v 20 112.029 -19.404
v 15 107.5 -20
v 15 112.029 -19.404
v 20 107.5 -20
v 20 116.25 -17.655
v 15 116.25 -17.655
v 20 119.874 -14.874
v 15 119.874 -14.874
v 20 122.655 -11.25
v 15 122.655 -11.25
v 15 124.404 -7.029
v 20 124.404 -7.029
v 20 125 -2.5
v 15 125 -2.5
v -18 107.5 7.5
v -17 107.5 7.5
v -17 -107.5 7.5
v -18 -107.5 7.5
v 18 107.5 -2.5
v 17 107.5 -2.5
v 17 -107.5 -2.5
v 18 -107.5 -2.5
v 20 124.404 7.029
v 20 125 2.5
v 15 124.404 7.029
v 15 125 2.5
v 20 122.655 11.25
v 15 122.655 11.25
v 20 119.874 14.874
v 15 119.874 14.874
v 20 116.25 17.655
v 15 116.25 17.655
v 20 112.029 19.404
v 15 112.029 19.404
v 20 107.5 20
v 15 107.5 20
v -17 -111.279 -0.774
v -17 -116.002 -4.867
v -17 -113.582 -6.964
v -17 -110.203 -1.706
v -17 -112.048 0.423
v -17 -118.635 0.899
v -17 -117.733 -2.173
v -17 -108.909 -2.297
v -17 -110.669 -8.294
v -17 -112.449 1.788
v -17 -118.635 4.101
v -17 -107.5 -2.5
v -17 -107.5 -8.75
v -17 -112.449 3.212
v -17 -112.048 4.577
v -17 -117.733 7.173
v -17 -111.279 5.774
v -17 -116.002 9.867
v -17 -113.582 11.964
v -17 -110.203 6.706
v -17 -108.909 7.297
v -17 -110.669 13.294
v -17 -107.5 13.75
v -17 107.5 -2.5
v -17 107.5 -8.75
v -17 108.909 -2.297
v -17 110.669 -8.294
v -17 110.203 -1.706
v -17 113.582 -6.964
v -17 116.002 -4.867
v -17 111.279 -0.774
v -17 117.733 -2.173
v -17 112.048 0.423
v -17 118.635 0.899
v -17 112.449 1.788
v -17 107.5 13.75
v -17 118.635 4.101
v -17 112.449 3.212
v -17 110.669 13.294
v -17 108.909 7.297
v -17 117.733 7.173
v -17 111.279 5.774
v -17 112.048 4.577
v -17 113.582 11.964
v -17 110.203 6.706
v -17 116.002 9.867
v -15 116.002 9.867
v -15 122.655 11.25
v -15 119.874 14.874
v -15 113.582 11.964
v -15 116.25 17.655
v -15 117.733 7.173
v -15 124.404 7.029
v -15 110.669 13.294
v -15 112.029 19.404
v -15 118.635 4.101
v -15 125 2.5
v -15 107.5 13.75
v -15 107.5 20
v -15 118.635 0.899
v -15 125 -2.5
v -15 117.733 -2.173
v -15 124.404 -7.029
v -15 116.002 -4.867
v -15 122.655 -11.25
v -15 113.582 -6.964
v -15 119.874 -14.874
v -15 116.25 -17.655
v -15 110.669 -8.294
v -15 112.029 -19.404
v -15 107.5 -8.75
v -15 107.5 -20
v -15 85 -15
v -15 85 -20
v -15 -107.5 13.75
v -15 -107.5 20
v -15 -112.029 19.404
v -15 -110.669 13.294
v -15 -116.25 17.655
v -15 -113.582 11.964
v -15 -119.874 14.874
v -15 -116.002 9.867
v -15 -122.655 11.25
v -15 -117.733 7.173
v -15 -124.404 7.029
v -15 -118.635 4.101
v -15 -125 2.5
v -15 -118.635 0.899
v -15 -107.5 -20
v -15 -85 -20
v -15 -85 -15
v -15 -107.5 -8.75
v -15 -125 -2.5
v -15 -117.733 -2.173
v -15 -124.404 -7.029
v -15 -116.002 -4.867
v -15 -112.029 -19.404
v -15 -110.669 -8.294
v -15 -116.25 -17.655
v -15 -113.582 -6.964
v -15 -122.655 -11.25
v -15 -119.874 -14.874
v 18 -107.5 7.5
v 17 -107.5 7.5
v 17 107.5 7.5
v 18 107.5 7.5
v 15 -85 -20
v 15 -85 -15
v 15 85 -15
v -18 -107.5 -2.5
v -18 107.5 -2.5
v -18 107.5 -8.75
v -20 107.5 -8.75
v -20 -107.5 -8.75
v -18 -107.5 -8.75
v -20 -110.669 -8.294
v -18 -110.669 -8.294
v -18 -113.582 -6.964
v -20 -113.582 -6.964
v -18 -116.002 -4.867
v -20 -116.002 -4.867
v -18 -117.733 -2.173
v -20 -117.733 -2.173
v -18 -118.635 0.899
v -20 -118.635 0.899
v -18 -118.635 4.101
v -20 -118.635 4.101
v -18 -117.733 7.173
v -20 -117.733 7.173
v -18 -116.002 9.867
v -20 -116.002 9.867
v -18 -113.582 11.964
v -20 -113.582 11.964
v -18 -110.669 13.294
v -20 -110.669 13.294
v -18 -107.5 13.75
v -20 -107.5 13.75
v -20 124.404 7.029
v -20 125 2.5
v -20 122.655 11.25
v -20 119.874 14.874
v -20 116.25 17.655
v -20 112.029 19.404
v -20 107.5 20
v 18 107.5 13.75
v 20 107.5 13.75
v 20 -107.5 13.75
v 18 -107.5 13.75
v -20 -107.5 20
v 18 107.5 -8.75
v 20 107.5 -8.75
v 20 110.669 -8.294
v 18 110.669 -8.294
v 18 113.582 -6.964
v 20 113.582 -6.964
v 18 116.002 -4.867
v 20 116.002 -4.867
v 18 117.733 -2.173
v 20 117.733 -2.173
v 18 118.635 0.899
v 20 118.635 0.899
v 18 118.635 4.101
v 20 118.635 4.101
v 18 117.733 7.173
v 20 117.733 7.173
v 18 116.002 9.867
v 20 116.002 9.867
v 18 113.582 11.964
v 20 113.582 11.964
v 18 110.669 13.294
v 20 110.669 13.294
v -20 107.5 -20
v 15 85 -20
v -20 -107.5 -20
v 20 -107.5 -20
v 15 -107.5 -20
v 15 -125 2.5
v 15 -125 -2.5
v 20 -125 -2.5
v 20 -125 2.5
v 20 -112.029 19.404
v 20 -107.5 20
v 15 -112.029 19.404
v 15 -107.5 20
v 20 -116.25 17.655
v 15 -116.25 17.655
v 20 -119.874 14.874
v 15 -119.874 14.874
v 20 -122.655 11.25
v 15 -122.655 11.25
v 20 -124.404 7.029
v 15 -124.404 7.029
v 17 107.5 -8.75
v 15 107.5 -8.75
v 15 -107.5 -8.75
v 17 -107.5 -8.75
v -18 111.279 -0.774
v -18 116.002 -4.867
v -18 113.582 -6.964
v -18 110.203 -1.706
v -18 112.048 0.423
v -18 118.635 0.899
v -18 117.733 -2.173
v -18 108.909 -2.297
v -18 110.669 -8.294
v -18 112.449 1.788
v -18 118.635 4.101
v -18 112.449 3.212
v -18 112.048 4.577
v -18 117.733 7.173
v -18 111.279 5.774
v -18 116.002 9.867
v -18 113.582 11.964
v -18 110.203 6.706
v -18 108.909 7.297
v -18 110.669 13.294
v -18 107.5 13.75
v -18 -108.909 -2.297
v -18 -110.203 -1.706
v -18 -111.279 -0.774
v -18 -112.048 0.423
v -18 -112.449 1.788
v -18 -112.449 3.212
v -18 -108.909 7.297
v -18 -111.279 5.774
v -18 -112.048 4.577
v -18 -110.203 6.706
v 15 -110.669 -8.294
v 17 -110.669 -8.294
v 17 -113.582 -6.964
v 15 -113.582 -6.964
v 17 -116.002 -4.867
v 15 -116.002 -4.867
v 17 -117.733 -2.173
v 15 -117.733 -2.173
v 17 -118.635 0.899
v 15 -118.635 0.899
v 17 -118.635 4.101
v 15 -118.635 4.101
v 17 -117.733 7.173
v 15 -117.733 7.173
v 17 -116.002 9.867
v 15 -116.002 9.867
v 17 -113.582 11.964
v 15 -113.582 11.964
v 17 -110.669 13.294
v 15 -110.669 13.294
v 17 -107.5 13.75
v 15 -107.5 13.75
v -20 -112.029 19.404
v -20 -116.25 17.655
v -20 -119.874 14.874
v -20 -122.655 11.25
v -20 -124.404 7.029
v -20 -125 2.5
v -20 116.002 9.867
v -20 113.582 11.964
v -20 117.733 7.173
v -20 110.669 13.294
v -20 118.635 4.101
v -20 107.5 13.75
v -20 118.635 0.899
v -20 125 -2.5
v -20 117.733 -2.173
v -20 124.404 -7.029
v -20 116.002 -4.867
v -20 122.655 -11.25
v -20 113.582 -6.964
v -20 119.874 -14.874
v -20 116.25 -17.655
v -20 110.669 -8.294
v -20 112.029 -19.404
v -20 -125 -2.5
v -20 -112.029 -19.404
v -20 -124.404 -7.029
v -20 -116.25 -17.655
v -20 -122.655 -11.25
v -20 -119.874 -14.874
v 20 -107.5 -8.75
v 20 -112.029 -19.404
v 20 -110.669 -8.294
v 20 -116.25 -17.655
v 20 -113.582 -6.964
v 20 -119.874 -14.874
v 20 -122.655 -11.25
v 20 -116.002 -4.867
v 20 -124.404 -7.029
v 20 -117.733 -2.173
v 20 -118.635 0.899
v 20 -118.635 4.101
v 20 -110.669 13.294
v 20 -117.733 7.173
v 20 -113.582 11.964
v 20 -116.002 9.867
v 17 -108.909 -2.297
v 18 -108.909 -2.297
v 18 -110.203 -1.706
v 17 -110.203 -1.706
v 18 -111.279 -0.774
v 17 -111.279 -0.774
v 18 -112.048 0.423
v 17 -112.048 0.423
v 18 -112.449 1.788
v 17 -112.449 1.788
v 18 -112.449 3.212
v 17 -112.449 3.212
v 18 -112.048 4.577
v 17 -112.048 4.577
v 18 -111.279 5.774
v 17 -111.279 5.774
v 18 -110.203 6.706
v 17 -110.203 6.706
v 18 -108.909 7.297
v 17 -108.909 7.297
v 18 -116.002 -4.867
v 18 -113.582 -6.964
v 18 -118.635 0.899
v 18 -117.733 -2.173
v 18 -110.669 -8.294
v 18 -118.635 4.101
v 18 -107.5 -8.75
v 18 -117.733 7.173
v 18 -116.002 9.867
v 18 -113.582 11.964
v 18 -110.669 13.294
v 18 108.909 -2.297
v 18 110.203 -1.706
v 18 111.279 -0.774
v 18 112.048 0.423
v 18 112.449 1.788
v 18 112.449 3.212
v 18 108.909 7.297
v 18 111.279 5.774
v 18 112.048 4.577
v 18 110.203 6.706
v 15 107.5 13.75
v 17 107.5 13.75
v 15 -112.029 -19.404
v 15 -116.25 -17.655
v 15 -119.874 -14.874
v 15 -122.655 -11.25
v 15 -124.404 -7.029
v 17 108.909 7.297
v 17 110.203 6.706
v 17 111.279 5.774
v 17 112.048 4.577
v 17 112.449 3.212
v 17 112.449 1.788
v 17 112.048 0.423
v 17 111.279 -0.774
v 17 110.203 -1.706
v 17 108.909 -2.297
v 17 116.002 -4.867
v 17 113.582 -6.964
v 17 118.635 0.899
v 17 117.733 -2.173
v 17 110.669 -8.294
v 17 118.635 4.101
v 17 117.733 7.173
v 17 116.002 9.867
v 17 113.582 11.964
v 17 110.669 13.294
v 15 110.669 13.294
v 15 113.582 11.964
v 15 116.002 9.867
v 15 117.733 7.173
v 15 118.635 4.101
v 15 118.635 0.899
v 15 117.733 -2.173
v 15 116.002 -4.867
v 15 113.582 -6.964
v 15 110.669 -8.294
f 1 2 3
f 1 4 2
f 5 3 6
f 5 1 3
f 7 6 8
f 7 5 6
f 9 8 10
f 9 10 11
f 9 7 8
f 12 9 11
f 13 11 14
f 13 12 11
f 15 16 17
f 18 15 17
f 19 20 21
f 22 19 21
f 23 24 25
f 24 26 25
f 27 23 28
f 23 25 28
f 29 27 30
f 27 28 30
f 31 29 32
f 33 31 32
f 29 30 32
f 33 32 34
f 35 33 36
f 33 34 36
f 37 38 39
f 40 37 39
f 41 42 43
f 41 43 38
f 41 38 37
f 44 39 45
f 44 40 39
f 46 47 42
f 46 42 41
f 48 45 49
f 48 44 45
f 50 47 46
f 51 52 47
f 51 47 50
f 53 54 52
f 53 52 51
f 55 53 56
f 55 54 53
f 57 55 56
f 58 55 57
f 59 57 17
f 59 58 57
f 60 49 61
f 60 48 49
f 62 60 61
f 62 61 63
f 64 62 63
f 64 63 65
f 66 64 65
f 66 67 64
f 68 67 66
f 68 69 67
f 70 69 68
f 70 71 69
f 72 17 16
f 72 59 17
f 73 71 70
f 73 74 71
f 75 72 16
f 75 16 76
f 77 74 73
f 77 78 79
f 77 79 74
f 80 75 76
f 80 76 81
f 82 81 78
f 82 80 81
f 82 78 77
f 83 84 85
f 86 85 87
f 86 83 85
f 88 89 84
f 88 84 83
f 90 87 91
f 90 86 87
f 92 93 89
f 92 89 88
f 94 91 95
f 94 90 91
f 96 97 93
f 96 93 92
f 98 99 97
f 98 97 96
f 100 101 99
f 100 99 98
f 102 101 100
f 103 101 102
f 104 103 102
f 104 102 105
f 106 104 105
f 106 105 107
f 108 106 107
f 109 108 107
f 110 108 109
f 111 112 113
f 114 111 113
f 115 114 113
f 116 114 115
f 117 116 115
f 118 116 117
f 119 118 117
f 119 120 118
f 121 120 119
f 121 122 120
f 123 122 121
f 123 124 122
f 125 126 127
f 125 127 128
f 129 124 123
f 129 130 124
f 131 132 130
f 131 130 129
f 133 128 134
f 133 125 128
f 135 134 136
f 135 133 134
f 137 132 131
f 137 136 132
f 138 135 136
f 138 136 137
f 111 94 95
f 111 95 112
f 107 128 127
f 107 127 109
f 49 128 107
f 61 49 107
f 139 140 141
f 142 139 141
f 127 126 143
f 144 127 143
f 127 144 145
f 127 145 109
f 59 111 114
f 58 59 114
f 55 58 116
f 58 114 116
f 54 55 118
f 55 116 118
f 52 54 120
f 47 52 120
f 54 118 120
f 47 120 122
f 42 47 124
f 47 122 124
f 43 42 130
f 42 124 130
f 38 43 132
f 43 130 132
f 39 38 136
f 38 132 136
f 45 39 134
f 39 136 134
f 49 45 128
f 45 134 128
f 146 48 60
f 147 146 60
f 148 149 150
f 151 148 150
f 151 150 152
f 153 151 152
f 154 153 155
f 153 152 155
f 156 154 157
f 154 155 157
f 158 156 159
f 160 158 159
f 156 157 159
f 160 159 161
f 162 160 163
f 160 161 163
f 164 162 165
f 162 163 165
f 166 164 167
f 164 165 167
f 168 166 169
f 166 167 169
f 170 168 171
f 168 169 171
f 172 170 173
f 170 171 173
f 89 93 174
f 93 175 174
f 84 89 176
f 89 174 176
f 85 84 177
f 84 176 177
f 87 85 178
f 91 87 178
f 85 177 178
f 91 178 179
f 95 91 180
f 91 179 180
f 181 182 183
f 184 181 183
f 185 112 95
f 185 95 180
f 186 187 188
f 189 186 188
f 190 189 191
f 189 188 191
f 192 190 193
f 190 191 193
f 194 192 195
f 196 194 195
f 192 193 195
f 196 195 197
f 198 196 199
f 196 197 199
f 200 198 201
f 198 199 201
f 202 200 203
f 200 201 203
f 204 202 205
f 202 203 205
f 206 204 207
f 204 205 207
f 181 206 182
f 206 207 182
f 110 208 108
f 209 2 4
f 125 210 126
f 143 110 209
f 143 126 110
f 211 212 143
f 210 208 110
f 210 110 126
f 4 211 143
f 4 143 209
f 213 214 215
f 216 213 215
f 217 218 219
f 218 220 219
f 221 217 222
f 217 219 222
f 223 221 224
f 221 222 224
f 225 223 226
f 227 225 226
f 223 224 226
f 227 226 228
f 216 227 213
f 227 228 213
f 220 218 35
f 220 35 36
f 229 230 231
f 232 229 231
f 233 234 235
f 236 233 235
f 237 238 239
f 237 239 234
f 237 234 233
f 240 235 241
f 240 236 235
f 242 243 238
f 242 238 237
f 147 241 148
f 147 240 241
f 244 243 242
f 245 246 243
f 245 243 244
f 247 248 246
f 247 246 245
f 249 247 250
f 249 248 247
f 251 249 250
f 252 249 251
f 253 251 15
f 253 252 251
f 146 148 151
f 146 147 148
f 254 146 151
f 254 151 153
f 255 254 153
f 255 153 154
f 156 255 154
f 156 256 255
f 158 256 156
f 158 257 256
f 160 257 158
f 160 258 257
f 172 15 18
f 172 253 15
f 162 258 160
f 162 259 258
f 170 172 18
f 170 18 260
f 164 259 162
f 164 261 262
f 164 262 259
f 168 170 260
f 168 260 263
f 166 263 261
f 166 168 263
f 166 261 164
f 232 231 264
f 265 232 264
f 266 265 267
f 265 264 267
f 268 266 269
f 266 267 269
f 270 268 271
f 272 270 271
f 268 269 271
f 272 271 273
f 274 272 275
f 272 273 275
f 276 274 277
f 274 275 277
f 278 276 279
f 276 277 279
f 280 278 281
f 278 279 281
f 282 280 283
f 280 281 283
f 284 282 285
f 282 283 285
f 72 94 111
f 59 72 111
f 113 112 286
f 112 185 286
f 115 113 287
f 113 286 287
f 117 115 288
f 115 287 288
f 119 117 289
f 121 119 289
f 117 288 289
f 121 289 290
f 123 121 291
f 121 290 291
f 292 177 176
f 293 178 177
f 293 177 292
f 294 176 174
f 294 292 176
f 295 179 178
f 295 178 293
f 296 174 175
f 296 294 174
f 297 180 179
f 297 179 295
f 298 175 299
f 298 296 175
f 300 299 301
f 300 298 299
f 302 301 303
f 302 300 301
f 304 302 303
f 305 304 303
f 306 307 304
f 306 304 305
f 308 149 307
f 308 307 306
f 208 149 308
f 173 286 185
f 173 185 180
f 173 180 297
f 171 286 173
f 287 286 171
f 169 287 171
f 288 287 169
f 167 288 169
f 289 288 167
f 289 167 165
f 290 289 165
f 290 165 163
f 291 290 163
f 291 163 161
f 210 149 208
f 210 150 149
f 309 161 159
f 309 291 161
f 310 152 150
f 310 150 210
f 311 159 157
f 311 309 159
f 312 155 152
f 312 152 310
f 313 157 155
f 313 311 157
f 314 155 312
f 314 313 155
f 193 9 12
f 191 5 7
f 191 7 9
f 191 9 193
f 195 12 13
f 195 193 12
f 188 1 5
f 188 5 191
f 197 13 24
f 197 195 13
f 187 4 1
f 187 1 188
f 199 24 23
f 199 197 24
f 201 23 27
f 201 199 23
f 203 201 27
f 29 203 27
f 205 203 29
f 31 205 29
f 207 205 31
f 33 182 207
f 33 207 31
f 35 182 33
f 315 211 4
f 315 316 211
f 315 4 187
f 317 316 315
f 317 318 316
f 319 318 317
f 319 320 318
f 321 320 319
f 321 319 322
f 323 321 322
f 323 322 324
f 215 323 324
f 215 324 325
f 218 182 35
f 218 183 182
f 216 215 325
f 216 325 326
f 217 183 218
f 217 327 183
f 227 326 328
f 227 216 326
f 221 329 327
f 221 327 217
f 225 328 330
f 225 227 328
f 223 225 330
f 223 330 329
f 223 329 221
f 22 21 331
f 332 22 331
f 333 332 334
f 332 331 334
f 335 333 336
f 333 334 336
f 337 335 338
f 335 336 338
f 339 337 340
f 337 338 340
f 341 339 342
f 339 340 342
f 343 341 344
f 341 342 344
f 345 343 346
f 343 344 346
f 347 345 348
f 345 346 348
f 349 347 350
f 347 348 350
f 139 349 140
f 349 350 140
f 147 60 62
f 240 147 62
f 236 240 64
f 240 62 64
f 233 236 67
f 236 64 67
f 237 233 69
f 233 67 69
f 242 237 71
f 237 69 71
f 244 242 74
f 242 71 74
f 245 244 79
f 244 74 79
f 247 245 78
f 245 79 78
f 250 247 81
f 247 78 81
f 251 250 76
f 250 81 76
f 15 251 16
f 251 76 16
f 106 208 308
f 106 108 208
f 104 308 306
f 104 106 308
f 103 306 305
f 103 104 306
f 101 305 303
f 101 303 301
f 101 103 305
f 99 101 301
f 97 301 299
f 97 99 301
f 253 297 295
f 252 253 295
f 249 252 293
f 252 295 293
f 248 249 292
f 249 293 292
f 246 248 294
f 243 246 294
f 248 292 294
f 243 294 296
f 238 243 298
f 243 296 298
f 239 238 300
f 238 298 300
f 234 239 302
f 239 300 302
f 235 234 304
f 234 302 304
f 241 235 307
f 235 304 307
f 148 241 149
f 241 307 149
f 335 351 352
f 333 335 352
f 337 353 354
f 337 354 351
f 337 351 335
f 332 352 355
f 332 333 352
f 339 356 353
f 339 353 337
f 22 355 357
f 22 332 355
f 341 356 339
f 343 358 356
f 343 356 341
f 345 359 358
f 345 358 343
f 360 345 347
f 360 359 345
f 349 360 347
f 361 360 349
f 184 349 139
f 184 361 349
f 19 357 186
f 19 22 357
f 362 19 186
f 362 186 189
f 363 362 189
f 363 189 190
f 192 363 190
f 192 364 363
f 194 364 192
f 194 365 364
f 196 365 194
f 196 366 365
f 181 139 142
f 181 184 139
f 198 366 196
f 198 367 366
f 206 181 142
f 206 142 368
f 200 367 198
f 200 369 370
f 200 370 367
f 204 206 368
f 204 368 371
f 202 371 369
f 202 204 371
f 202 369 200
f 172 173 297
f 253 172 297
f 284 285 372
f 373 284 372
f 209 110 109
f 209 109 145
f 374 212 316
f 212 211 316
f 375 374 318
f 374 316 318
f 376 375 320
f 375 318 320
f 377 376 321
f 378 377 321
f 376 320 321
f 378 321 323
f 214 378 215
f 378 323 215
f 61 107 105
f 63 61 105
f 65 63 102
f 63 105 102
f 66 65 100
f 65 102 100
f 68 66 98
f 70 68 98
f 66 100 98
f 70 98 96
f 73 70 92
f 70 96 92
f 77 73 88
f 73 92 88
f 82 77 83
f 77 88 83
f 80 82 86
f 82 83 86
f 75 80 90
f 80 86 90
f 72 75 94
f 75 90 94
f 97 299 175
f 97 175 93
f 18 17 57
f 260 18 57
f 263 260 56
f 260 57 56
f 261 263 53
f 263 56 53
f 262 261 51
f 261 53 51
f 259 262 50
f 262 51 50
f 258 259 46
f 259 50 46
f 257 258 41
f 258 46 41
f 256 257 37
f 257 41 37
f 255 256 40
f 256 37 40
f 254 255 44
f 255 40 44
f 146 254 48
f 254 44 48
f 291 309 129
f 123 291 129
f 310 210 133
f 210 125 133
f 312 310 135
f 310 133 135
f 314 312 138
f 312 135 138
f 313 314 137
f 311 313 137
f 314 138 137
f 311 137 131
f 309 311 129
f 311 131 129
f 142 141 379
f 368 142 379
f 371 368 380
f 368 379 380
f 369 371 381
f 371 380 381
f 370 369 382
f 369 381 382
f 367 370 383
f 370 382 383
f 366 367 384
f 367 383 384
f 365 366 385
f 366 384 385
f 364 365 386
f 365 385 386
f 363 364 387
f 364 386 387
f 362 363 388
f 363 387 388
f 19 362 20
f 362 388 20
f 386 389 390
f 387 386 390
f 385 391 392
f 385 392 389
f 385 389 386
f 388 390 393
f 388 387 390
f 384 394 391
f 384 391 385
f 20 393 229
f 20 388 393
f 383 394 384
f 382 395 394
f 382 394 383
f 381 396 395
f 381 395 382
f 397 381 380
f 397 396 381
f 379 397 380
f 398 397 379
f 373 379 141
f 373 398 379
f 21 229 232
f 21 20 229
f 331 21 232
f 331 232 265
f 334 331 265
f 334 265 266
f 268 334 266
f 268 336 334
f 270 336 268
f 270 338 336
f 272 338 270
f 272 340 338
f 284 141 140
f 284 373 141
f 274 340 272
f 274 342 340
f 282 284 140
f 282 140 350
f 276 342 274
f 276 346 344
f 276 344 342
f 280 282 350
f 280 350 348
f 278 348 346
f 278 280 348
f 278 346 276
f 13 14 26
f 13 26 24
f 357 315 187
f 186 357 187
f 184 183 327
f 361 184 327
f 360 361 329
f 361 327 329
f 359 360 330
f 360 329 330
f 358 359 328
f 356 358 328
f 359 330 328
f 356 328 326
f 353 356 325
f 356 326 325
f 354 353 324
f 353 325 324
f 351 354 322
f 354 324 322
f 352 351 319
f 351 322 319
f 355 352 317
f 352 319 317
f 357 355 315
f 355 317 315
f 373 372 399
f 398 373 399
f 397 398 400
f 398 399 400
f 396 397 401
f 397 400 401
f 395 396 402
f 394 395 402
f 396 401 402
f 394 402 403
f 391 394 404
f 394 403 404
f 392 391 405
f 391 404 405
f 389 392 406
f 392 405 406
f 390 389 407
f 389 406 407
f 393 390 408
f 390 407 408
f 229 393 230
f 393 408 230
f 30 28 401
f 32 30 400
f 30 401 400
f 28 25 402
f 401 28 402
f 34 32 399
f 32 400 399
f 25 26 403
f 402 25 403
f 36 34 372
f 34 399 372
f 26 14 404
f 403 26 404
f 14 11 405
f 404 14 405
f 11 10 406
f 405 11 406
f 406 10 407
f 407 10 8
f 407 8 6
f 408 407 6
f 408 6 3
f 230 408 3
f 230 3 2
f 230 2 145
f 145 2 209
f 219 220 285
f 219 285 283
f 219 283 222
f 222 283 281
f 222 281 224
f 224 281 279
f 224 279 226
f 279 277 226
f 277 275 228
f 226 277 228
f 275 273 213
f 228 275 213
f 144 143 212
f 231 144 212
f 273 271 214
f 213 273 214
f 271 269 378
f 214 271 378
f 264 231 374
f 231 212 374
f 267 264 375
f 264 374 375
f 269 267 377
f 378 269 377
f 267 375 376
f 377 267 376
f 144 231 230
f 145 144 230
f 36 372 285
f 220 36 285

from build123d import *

# Parameters (mm, degrees)
F1_DEPTH      = 125
F1_DEPTH_BACK = 125
F6_DEPTH      = 5.001
F7_DEPTH      = 5.001
F8_DEPTH      = 2
F9_DEPTH      = 2
F10_DEPTH     = 2
F11_DEPTH     = 2
F12_W         = 30
F12_H         = 40
F13_DEPTH     = 40.001
F14_R         = 17.5


with BuildPart() as f1:
    # F0 (on Front) → F1 (new body, two sides)
    with BuildSketch(Plane.XZ) as f1_sk:
        Polygon((-20, -20), (20, -20), (20, 20), (15, 20), (15, -15), (-15, -15), (-15, 20), (-20, 20), align=None)
    extrude(amount=F1_DEPTH)
    extrude(f1_sk.sketch, amount=-F1_DEPTH_BACK)

    # F3 (on face) → F6 (cut, through all)
    with BuildSketch(Plane(origin=(15, 0, 0), x_dir=(0, -1, 0), z_dir=(-1, 0, 0))):
        with BuildLine():
            Line((107.5, 7.5), (0, 7.5))
            Line((0, 7.5), (-107.5, 7.5))
            ThreePointArc((-107.5, 7.5), (-112.5, 2.5), (-107.5, -2.5))
            Line((-107.5, -2.5), (0, -2.5))
            Line((0, -2.5), (107.5, -2.5))
            ThreePointArc((107.5, -2.5), (112.5, 2.5), (107.5, 7.5))
        make_face()
    extrude(amount=-F6_DEPTH, mode=Mode.SUBTRACT)

    # F2 (on face) → F7 (cut, through all)
    with BuildSketch(Plane.YZ.offset(-15)):
        with BuildLine():
            Line((107.5, 7.5), (0, 7.5))
            Line((0, 7.5), (-107.5, 7.5))
            ThreePointArc((-107.5, 7.5), (-112.5, 2.5), (-107.5, -2.5))
            Line((-107.5, -2.5), (0, -2.5))
            Line((0, -2.5), (107.5, -2.5))
            ThreePointArc((107.5, -2.5), (112.5, 2.5), (107.5, 7.5))
        make_face()
    extrude(amount=-F7_DEPTH, mode=Mode.SUBTRACT)

    # F3 (on face) → F8 (cut)
    with BuildSketch(Plane(origin=(15, 0, 0), x_dir=(0, -1, 0), z_dir=(-1, 0, 0))):
        with BuildLine():
            Line((107.5, 13.75), (0, 13.75))
            Line((0, 13.75), (-107.5, 13.75))
            ThreePointArc((-107.5, 13.75), (-118.75, 2.5), (-107.5, -8.75))
            Line((-107.5, -8.75), (0, -8.75))
            Line((0, -8.75), (107.5, -8.75))
            ThreePointArc((107.5, -8.75), (118.75, 2.5), (107.5, 13.75))
        make_face()
        with BuildLine():
            Line((-107.5, 7.5), (0, 7.5))
            Line((0, 7.5), (107.5, 7.5))
            ThreePointArc((107.5, 7.5), (112.5, 2.5), (107.5, -2.5))
            Line((107.5, -2.5), (0, -2.5))
            Line((0, -2.5), (-107.5, -2.5))
            ThreePointArc((-107.5, -2.5), (-112.5, 2.5), (-107.5, 7.5))
        make_face(mode=Mode.SUBTRACT)
    extrude(amount=-F8_DEPTH, mode=Mode.SUBTRACT)

    # F2 (on face) → F9 (cut)
    with BuildSketch(Plane.YZ.offset(-15)):
        with BuildLine():
            Line((107.5, 13.75), (0, 13.75))
            Line((0, 13.75), (-107.5, 13.75))
            ThreePointArc((-107.5, 13.75), (-118.75, 2.5), (-107.5, -8.75))
            Line((-107.5, -8.75), (0, -8.75))
            Line((0, -8.75), (107.5, -8.75))
            ThreePointArc((107.5, -8.75), (118.75, 2.5), (107.5, 13.75))
        make_face()
        with BuildLine():
            Line((-107.5, 7.5), (0, 7.5))
            Line((0, 7.5), (107.5, 7.5))
            ThreePointArc((107.5, 7.5), (112.5, 2.5), (107.5, -2.5))
            Line((107.5, -2.5), (0, -2.5))
            Line((0, -2.5), (-107.5, -2.5))
            ThreePointArc((-107.5, -2.5), (-112.5, 2.5), (-107.5, 7.5))
        make_face(mode=Mode.SUBTRACT)
    extrude(amount=-F9_DEPTH, mode=Mode.SUBTRACT)

    # F4 (on face) → F10 (cut)
    with BuildSketch(Plane(origin=(-20, 0, 0), x_dir=(0, -1, 0), z_dir=(-1, 0, 0))):
        with BuildLine():
            Line((107.5, 13.75), (0, 13.75))
            Line((0, 13.75), (-107.5, 13.75))
            ThreePointArc((-107.5, 13.75), (-118.75, 2.5), (-107.5, -8.75))
            Line((-107.5, -8.75), (0, -8.75))
            Line((0, -8.75), (107.5, -8.75))
            ThreePointArc((107.5, -8.75), (118.75, 2.5), (107.5, 13.75))
        make_face()
        with BuildLine():
            Line((-107.5, 7.5), (0, 7.5))
            Line((0, 7.5), (107.5, 7.5))
            ThreePointArc((107.5, 7.5), (112.5, 2.5), (107.5, -2.5))
            Line((107.5, -2.5), (0, -2.5))
            Line((0, -2.5), (-107.5, -2.5))
            ThreePointArc((-107.5, -2.5), (-112.5, 2.5), (-107.5, 7.5))
        make_face(mode=Mode.SUBTRACT)
    extrude(amount=-F10_DEPTH, mode=Mode.SUBTRACT)

    # F5 (on face) → F11 (cut)
    with BuildSketch(Plane.YZ.offset(20)):
        with BuildLine():
            Line((107.5, 13.75), (0, 13.75))
            Line((0, 13.75), (-107.5, 13.75))
            ThreePointArc((-107.5, 13.75), (-118.75, 2.5), (-107.5, -8.75))
            Line((-107.5, -8.75), (0, -8.75))
            Line((0, -8.75), (107.5, -8.75))
            ThreePointArc((107.5, -8.75), (118.75, 2.5), (107.5, 13.75))
        make_face()
        with BuildLine():
            Line((-107.5, 7.5), (0, 7.5))
            Line((0, 7.5), (107.5, 7.5))
            ThreePointArc((107.5, 7.5), (112.5, 2.5), (107.5, -2.5))
            Line((107.5, -2.5), (0, -2.5))
            Line((0, -2.5), (-107.5, -2.5))
            ThreePointArc((-107.5, -2.5), (-112.5, 2.5), (-107.5, 7.5))
        make_face(mode=Mode.SUBTRACT)
    extrude(amount=-F11_DEPTH, mode=Mode.SUBTRACT)

    # F12 (on face) → F13 (cut, through all)
    with BuildSketch(Plane(origin=(0, 0, -20), x_dir=(1, 0, 0), z_dir=(0, 0, -1))):
        with Locations((0, -105)):
            Rectangle(F12_W, F12_H)
        with Locations((0, 105)):
            Rectangle(F12_W, F12_H)
    extrude(amount=-F13_DEPTH, mode=Mode.SUBTRACT)

    # F14
    f14_edges = [f1.edges().sort_by_distance(p)[0] for p in [
        (-17.5, 125, -20),
        (17.5, 125, -20),
        (-17.5, 125, 20),
        (17.5, 125, 20),
        (17.5, -125, -20),
        (-17.5, -125, -20),
        (17.5, -125, 20),
        (-17.5, -125, 20),
    ]]
    fillet(f14_edges, radius=F14_R)


solid = f1.part
